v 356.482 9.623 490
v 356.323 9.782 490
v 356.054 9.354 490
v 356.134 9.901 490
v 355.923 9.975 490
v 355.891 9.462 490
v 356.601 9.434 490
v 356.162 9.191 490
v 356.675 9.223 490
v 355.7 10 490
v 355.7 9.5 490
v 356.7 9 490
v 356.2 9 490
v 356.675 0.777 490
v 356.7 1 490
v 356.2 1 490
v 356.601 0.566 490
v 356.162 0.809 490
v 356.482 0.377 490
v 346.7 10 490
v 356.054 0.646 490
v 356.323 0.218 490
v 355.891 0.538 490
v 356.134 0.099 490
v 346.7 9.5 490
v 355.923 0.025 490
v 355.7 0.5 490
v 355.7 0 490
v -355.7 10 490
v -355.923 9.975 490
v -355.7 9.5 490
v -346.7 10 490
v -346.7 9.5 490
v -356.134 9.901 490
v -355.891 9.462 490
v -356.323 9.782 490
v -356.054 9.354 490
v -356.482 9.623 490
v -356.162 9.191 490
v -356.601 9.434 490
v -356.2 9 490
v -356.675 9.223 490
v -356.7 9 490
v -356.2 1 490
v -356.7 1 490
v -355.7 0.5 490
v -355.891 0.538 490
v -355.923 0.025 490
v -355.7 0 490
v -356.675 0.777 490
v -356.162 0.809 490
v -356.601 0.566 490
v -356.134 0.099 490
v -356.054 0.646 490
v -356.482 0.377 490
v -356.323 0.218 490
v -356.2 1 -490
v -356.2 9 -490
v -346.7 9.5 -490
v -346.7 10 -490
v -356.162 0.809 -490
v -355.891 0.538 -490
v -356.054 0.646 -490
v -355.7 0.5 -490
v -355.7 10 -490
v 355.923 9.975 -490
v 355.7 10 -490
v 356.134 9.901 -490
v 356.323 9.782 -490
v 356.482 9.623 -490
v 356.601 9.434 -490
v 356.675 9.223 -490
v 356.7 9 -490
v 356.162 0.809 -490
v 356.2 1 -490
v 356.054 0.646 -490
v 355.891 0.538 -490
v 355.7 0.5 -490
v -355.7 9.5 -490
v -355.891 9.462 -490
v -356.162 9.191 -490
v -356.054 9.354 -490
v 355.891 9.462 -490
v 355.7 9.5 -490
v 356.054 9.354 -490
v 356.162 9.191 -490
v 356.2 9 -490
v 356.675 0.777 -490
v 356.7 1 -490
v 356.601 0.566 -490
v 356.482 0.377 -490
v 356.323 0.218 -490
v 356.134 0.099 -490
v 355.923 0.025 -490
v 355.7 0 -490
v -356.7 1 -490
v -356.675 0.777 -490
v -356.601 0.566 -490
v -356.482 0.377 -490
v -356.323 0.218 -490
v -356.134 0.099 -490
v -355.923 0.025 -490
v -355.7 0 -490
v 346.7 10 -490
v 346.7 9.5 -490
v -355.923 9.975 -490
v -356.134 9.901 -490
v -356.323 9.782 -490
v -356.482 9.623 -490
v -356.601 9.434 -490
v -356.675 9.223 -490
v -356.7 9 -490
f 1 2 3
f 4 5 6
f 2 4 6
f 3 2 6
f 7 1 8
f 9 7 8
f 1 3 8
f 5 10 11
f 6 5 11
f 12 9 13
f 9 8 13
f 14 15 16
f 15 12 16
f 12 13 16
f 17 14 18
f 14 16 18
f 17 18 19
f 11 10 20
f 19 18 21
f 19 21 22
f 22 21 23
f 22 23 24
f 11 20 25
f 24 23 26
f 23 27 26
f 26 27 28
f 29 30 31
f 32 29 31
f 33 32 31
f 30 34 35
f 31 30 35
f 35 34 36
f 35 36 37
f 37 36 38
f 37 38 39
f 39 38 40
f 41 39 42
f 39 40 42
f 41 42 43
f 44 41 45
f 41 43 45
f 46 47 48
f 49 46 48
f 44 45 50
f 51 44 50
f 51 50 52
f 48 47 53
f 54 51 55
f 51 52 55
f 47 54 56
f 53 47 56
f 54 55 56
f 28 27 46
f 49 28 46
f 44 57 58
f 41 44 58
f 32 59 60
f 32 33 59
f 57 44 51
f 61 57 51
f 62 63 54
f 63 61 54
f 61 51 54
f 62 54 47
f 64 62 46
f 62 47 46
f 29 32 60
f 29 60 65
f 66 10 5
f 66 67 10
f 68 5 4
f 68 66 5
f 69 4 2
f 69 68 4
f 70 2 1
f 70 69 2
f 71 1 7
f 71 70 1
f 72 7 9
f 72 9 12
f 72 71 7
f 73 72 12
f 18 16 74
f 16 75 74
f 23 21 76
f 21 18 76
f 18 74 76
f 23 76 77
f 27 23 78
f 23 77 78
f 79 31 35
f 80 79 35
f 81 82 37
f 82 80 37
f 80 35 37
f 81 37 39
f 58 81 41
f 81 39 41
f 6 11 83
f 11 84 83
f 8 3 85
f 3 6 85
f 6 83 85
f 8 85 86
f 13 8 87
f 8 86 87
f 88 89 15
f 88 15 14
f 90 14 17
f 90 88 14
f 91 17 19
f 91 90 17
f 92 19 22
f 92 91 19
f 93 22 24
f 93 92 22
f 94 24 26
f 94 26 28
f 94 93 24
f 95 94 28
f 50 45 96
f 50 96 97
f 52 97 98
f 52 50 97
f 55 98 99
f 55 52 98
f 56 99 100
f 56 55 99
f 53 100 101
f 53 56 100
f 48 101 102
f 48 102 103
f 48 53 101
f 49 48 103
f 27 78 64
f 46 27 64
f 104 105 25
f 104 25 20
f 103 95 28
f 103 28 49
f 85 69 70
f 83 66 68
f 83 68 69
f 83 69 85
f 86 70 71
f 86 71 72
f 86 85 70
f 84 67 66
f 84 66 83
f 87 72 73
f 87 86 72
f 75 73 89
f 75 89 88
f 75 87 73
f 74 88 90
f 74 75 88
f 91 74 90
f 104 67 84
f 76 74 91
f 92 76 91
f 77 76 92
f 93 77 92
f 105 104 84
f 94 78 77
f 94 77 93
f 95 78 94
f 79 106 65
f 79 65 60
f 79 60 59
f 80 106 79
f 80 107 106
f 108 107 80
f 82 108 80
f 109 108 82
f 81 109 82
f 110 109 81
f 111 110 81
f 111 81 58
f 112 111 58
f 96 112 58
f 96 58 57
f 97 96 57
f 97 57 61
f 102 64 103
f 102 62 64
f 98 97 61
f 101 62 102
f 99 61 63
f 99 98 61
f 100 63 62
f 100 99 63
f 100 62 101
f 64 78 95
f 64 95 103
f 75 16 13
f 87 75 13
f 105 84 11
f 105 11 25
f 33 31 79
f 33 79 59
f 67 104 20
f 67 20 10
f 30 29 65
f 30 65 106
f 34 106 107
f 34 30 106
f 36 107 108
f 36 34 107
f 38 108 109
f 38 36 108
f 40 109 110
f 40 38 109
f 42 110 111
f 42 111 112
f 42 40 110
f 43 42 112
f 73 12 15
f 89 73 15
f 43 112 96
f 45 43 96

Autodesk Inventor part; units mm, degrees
ref_plane "YZ Plane" through (0, 0, 0) normal (1, 0, 0) x (0, 1, 0)
ref_plane "XZ Plane" through (0, 0, 0) normal (0, 1, 0) x (-1, 0, 0)
ref_plane "XY Plane" through (0, 0, 0) normal (0, 0, 1) x (1, 0, 0)
sketch "Sketch6" plane through (0, 0, 0) normal (0, 1, 0) x (-1, 0, 0)
  line L0 (356.7, -490) -> (-356.7, -490)
  line L1 (-356.7, -490) -> (-356.7, 490)
  line L2 (-356.7, 490) -> (356.7, 490)
  line L3 (356.7, 490) -> (356.7, -490)
  line L4 (356.7, -490) -> (-356.7, 490) construction
  line L5 (-356.7, -490) -> (356.7, 490) construction
  point P0 (0, 0)
  dimension "d52" = 713.4
  dimension "d53" = 980
extrude "Plate2" add sketch "Sketch6" along normal blind 0.5
sketch "Sketch11" plane through (-356.2, 0, 490) normal (-1, 0, 0) x (0, -1, 0)
  line L0 (0, -980) -> (0, 0)
  line L1 (0, 0) -> (-10, 0)
  line L2 (-10, 0) -> (-10, -980)
  line L3 (-10, -980) -> (0, -980)
edge flange "Flange2" height 10 angle 90 thickness 0.5 bend radius 0.5 thickness toward (-1, 0, 0) relief tear relief width 0.5 relief depth 0.25 edges at (-356.7, 0.5, 0) wall of the first edge with corners at (-356.2, 0, -490) (-356.2, 0, 490) (-356.2, 10, 490) (-356.2, 10, -490)
bend "Bend3"
corner "Corner3"
sketch "Sketch12" plane through (-356.7, 9.5, 490) normal (0, 1, 0) x (-1, 0, 0)
  line L0 (0, -980) -> (0, 0)
  line L1 (0, 0) -> (-10, 0)
  line L2 (-10, 0) -> (-10, -980)
  line L3 (-10, -980) -> (0, -980)
edge flange "Flange3" height 10 angle 90 thickness 0.5 bend radius 0.5 thickness toward (0, 1, 0) relief tear relief width 0.5 relief depth 0.25 edges at (-356.2, 10, 0) wall of the first edge with corners at (-356.7, 9.5, -490) (-356.7, 9.5, 490) (-346.7, 9.5, 490) (-346.7, 9.5, -490)
bend "Bend4"
corner "Corner4"
sketch "Sketch13" plane through (356.2, 0, -490) normal (1, 0, 0) x (0, 1, 0)
  line L0 (0, 980) -> (0, 0)
  line L1 (0, 0) -> (10, 0)
  line L2 (10, 0) -> (10, 980)
  line L3 (10, 980) -> (0, 980)
edge flange "Flange4" height 10 angle 90 thickness 0.5 bend radius 0.5 thickness toward (1, 0, 0) relief tear relief width 0.5 relief depth 0.25 edges at (356.7, 0.5, 0) wall of the first edge with corners at (356.2, 0, 490) (356.2, 0, -490) (356.2, 10, -490) (356.2, 10, 490)
bend "Bend5"
corner "Corner5"
sketch "Sketch14" plane through (356.7, 9.5, -490) normal (0, 1, 0) x (-1, 0, 0)
  line L0 (0, 980) -> (0, 0)
  line L1 (0, 0) -> (10, 0)
  line L2 (10, 0) -> (10, 980)
  line L3 (10, 980) -> (0, 980)
edge flange "Flange5" height 10 angle 90 thickness 0.5 bend radius 0.5 thickness toward (0, 1, 0) relief tear relief width 0.5 relief depth 0.25 edges at (356.2, 10, 0) wall of the first edge with corners at (356.7, 9.5, 490) (356.7, 9.5, -490) (346.7, 9.5, -490) (346.7, 9.5, 490)
bend "Bend6"
corner "Corner6"
equation "\"d52\" = ЖАБРЫ_базовая_ширина - 2 * ЖАБРЫ_шаг_листов"
equation "\"d53\" = ЖАБРЫ_базовая_длина_кор_лист"
equation "\"d54\" = Thickness"
equation "\"d84\" = BendReliefWidth"
equation "\"d85\" = BendReliefDepth"
equation "\"d86\" = MinimumRemnant"
equation "\"d87\" = TransitionRadius"
equation "\"d90\" = BendRadius"
equation "\"d91\" = CornerReliefSize"
equation "\"d92\" = GapSize"
equation "\"d93\" = JacobiRadiusSize"
equation "\"d94\" = BendReliefWidth"
equation "\"d95\" = BendReliefDepth"
equation "\"d96\" = MinimumRemnant"
equation "\"d97\" = TransitionRadius"
equation "\"d100\" = BendRadius"
equation "\"d101\" = CornerReliefSize"
equation "\"d102\" = GapSize"
equation "\"d103\" = JacobiRadiusSize"
equation "\"d104\" = BendReliefWidth"
equation "\"d105\" = BendReliefDepth"
equation "\"d106\" = MinimumRemnant"
equation "\"d107\" = TransitionRadius"
equation "\"d110\" = BendRadius"
equation "\"d111\" = CornerReliefSize"
equation "\"d112\" = GapSize"
equation "\"d113\" = JacobiRadiusSize"
equation "\"d114\" = BendReliefWidth"
equation "\"d115\" = BendReliefDepth"
equation "\"d116\" = MinimumRemnant"
equation "\"d117\" = TransitionRadius"
equation "\"d120\" = BendRadius"
equation "\"d121\" = CornerReliefSize"
equation "\"d122\" = GapSize"
equation "\"d123\" = JacobiRadiusSize"
equation "\"BendRadius\" = Thickness"
equation "\"BendReliefWidth\" = Thickness"
equation "\"BendReliefDepth\" = 0.5 * Thickness"
equation "\"CornerReliefSize\" = 4 * Thickness"
equation "\"MinimumRemnant\" = 2 * Thickness"
equation "\"TransitionRadius\" = BendRadius"
equation "\"JacobiRadiusSize\" = BendRadius"
equation "\"GapSize\" = Thickness"
equation "\"ЖАБРЫ_базовая_ширина\" = 915"
equation "\"ЖАБРЫ_шаг_листов\" = 100.8"
equation "\"ЖАБРЫ_базовая_длина_кор_лист\" = 980"
equation "\"Thickness\" = 0.5"
properties part number "MSC 805 sheet gills" material "Stainless Steel"
